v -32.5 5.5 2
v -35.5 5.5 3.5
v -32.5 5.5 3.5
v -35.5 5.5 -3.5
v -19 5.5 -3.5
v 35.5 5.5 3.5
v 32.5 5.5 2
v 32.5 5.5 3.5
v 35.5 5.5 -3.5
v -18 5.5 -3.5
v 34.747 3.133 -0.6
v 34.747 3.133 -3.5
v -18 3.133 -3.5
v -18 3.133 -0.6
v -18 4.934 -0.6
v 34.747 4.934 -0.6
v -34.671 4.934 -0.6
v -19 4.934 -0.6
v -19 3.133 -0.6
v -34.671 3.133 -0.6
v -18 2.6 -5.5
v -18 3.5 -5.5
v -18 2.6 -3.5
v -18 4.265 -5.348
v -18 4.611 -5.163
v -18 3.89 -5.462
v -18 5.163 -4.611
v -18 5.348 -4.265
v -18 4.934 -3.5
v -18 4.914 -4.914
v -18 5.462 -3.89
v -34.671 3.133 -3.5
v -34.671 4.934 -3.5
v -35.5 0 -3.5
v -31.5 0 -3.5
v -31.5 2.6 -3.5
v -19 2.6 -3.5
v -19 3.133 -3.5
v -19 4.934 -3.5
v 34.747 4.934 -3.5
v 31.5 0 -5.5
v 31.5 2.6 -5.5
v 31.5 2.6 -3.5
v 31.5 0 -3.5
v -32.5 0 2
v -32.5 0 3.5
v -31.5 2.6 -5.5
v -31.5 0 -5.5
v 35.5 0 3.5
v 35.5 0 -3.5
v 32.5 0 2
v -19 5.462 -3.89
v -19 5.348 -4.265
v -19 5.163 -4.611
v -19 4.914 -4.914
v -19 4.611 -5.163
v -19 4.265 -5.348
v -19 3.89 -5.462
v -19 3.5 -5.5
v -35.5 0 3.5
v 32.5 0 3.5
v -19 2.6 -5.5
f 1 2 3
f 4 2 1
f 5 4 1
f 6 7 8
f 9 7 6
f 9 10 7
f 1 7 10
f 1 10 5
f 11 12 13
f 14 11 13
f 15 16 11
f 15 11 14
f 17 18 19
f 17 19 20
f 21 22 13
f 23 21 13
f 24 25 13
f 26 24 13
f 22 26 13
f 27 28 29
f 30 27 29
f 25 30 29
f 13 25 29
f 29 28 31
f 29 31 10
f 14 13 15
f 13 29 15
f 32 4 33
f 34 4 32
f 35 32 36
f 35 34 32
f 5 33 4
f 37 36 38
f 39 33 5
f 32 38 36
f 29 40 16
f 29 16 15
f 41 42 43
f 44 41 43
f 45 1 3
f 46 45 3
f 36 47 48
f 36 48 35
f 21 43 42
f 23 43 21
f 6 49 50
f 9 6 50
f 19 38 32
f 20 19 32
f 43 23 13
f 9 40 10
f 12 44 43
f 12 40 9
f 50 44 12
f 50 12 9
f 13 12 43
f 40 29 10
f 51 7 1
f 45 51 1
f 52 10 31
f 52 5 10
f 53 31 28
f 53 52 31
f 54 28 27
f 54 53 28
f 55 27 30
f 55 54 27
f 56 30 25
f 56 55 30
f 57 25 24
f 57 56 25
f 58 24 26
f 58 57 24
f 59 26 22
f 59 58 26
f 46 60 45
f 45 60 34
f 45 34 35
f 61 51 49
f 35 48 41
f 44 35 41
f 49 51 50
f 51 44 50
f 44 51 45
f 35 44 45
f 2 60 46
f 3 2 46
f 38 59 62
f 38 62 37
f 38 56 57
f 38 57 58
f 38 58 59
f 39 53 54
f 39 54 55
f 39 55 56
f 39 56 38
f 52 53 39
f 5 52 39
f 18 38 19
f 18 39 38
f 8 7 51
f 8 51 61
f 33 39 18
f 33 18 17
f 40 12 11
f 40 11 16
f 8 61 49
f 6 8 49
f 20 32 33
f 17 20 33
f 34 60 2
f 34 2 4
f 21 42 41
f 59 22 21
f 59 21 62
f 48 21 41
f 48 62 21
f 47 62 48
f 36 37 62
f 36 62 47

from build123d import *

# Parameters (mm, degrees)
CROQUIS1_W            = 71
CROQUIS1_H            = 7
EXTRUIR1_DEPTH        = 5.5
CROQUIS2_W            = 65
CROQUIS2_H            = 2.766320183
CORTAR_EXTRUIR1_DEPTH = 7.5
CROQUIS3_W            = 63
CROQUIS3_H            = 2
EXTRUIR2_DEPTH        = 5.5
CROQUIS4_W            = 49.5
CROQUIS4_H            = 2
CROQUIS4_W_2          = 12.5
CORTAR_EXTRUIR2_DEPTH = 2.9
REDONDEO1_R           = 2
CROQUIS5_W            = 15.670728733
CROQUIS5_H            = 1.800640157
CROQUIS5_W_2          = 52.74714617
CORTAR_EXTRUIR3_DEPTH = 2.9


with BuildPart() as part:
    # Croquis1 → Extruir1 (new body)
    with BuildSketch(Plane(origin=(0, 0, 0), x_dir=(1, 0, 0), z_dir=(0, 1, 0))):
        Rectangle(CROQUIS1_W, CROQUIS1_H)
    extrude(amount=EXTRUIR1_DEPTH)

    # Croquis2 → Cortar-Extruir1 (cut)
    with BuildSketch(Plane(origin=(0, 5.5, 0), x_dir=(-1, 0, 0), z_dir=(0, 1, 0))):
        with Locations((0, 3.383160092)):
            Rectangle(CROQUIS2_W, CROQUIS2_H)
    extrude(amount=-CORTAR_EXTRUIR1_DEPTH, mode=Mode.SUBTRACT)

    # Croquis3 → Extruir2 (add)
    with BuildSketch(Plane(origin=(0, 5.5, 0), x_dir=(-1, 0, 0), z_dir=(0, 1, 0))):
        with Locations((0, -4.5)):
            Rectangle(CROQUIS3_W, CROQUIS3_H)
    extrude(amount=-EXTRUIR2_DEPTH)

    # Croquis4 → Cortar-Extruir2 (cut)
    with BuildSketch(Plane(origin=(0, 5.5, 0), x_dir=(-1, 0, 0), z_dir=(0, 1, 0))):
        with Locations((-6.75, -4.5)):
            Rectangle(CROQUIS4_W, CROQUIS4_H)
        with Locations((25.25, -4.5)):
            Rectangle(CROQUIS4_W_2, CROQUIS4_H)
    extrude(amount=-CORTAR_EXTRUIR2_DEPTH, mode=Mode.SUBTRACT)

    # Redondeo1
    redondeo1_edges = [part.edges().sort_by_distance(p)[0] for p in [
        (-18.5, 5.5, -5.5),
    ]]
    fillet(redondeo1_edges, radius=REDONDEO1_R)

    # Croquis5 → Cortar-Extruir3 (cut)
    with BuildSketch(Plane(origin=(0, 0, -3.5), x_dir=(-1, 0, 0), z_dir=(0, 0, -1))):
        with Locations((26.835364367, 4.033789802)):
            Rectangle(CROQUIS5_W, CROQUIS5_H)
        with Locations((-8.373573085, 4.033789802)):
            Rectangle(CROQUIS5_W_2, CROQUIS5_H)
    extrude(amount=-CORTAR_EXTRUIR3_DEPTH, mode=Mode.SUBTRACT)


solid = part.part
